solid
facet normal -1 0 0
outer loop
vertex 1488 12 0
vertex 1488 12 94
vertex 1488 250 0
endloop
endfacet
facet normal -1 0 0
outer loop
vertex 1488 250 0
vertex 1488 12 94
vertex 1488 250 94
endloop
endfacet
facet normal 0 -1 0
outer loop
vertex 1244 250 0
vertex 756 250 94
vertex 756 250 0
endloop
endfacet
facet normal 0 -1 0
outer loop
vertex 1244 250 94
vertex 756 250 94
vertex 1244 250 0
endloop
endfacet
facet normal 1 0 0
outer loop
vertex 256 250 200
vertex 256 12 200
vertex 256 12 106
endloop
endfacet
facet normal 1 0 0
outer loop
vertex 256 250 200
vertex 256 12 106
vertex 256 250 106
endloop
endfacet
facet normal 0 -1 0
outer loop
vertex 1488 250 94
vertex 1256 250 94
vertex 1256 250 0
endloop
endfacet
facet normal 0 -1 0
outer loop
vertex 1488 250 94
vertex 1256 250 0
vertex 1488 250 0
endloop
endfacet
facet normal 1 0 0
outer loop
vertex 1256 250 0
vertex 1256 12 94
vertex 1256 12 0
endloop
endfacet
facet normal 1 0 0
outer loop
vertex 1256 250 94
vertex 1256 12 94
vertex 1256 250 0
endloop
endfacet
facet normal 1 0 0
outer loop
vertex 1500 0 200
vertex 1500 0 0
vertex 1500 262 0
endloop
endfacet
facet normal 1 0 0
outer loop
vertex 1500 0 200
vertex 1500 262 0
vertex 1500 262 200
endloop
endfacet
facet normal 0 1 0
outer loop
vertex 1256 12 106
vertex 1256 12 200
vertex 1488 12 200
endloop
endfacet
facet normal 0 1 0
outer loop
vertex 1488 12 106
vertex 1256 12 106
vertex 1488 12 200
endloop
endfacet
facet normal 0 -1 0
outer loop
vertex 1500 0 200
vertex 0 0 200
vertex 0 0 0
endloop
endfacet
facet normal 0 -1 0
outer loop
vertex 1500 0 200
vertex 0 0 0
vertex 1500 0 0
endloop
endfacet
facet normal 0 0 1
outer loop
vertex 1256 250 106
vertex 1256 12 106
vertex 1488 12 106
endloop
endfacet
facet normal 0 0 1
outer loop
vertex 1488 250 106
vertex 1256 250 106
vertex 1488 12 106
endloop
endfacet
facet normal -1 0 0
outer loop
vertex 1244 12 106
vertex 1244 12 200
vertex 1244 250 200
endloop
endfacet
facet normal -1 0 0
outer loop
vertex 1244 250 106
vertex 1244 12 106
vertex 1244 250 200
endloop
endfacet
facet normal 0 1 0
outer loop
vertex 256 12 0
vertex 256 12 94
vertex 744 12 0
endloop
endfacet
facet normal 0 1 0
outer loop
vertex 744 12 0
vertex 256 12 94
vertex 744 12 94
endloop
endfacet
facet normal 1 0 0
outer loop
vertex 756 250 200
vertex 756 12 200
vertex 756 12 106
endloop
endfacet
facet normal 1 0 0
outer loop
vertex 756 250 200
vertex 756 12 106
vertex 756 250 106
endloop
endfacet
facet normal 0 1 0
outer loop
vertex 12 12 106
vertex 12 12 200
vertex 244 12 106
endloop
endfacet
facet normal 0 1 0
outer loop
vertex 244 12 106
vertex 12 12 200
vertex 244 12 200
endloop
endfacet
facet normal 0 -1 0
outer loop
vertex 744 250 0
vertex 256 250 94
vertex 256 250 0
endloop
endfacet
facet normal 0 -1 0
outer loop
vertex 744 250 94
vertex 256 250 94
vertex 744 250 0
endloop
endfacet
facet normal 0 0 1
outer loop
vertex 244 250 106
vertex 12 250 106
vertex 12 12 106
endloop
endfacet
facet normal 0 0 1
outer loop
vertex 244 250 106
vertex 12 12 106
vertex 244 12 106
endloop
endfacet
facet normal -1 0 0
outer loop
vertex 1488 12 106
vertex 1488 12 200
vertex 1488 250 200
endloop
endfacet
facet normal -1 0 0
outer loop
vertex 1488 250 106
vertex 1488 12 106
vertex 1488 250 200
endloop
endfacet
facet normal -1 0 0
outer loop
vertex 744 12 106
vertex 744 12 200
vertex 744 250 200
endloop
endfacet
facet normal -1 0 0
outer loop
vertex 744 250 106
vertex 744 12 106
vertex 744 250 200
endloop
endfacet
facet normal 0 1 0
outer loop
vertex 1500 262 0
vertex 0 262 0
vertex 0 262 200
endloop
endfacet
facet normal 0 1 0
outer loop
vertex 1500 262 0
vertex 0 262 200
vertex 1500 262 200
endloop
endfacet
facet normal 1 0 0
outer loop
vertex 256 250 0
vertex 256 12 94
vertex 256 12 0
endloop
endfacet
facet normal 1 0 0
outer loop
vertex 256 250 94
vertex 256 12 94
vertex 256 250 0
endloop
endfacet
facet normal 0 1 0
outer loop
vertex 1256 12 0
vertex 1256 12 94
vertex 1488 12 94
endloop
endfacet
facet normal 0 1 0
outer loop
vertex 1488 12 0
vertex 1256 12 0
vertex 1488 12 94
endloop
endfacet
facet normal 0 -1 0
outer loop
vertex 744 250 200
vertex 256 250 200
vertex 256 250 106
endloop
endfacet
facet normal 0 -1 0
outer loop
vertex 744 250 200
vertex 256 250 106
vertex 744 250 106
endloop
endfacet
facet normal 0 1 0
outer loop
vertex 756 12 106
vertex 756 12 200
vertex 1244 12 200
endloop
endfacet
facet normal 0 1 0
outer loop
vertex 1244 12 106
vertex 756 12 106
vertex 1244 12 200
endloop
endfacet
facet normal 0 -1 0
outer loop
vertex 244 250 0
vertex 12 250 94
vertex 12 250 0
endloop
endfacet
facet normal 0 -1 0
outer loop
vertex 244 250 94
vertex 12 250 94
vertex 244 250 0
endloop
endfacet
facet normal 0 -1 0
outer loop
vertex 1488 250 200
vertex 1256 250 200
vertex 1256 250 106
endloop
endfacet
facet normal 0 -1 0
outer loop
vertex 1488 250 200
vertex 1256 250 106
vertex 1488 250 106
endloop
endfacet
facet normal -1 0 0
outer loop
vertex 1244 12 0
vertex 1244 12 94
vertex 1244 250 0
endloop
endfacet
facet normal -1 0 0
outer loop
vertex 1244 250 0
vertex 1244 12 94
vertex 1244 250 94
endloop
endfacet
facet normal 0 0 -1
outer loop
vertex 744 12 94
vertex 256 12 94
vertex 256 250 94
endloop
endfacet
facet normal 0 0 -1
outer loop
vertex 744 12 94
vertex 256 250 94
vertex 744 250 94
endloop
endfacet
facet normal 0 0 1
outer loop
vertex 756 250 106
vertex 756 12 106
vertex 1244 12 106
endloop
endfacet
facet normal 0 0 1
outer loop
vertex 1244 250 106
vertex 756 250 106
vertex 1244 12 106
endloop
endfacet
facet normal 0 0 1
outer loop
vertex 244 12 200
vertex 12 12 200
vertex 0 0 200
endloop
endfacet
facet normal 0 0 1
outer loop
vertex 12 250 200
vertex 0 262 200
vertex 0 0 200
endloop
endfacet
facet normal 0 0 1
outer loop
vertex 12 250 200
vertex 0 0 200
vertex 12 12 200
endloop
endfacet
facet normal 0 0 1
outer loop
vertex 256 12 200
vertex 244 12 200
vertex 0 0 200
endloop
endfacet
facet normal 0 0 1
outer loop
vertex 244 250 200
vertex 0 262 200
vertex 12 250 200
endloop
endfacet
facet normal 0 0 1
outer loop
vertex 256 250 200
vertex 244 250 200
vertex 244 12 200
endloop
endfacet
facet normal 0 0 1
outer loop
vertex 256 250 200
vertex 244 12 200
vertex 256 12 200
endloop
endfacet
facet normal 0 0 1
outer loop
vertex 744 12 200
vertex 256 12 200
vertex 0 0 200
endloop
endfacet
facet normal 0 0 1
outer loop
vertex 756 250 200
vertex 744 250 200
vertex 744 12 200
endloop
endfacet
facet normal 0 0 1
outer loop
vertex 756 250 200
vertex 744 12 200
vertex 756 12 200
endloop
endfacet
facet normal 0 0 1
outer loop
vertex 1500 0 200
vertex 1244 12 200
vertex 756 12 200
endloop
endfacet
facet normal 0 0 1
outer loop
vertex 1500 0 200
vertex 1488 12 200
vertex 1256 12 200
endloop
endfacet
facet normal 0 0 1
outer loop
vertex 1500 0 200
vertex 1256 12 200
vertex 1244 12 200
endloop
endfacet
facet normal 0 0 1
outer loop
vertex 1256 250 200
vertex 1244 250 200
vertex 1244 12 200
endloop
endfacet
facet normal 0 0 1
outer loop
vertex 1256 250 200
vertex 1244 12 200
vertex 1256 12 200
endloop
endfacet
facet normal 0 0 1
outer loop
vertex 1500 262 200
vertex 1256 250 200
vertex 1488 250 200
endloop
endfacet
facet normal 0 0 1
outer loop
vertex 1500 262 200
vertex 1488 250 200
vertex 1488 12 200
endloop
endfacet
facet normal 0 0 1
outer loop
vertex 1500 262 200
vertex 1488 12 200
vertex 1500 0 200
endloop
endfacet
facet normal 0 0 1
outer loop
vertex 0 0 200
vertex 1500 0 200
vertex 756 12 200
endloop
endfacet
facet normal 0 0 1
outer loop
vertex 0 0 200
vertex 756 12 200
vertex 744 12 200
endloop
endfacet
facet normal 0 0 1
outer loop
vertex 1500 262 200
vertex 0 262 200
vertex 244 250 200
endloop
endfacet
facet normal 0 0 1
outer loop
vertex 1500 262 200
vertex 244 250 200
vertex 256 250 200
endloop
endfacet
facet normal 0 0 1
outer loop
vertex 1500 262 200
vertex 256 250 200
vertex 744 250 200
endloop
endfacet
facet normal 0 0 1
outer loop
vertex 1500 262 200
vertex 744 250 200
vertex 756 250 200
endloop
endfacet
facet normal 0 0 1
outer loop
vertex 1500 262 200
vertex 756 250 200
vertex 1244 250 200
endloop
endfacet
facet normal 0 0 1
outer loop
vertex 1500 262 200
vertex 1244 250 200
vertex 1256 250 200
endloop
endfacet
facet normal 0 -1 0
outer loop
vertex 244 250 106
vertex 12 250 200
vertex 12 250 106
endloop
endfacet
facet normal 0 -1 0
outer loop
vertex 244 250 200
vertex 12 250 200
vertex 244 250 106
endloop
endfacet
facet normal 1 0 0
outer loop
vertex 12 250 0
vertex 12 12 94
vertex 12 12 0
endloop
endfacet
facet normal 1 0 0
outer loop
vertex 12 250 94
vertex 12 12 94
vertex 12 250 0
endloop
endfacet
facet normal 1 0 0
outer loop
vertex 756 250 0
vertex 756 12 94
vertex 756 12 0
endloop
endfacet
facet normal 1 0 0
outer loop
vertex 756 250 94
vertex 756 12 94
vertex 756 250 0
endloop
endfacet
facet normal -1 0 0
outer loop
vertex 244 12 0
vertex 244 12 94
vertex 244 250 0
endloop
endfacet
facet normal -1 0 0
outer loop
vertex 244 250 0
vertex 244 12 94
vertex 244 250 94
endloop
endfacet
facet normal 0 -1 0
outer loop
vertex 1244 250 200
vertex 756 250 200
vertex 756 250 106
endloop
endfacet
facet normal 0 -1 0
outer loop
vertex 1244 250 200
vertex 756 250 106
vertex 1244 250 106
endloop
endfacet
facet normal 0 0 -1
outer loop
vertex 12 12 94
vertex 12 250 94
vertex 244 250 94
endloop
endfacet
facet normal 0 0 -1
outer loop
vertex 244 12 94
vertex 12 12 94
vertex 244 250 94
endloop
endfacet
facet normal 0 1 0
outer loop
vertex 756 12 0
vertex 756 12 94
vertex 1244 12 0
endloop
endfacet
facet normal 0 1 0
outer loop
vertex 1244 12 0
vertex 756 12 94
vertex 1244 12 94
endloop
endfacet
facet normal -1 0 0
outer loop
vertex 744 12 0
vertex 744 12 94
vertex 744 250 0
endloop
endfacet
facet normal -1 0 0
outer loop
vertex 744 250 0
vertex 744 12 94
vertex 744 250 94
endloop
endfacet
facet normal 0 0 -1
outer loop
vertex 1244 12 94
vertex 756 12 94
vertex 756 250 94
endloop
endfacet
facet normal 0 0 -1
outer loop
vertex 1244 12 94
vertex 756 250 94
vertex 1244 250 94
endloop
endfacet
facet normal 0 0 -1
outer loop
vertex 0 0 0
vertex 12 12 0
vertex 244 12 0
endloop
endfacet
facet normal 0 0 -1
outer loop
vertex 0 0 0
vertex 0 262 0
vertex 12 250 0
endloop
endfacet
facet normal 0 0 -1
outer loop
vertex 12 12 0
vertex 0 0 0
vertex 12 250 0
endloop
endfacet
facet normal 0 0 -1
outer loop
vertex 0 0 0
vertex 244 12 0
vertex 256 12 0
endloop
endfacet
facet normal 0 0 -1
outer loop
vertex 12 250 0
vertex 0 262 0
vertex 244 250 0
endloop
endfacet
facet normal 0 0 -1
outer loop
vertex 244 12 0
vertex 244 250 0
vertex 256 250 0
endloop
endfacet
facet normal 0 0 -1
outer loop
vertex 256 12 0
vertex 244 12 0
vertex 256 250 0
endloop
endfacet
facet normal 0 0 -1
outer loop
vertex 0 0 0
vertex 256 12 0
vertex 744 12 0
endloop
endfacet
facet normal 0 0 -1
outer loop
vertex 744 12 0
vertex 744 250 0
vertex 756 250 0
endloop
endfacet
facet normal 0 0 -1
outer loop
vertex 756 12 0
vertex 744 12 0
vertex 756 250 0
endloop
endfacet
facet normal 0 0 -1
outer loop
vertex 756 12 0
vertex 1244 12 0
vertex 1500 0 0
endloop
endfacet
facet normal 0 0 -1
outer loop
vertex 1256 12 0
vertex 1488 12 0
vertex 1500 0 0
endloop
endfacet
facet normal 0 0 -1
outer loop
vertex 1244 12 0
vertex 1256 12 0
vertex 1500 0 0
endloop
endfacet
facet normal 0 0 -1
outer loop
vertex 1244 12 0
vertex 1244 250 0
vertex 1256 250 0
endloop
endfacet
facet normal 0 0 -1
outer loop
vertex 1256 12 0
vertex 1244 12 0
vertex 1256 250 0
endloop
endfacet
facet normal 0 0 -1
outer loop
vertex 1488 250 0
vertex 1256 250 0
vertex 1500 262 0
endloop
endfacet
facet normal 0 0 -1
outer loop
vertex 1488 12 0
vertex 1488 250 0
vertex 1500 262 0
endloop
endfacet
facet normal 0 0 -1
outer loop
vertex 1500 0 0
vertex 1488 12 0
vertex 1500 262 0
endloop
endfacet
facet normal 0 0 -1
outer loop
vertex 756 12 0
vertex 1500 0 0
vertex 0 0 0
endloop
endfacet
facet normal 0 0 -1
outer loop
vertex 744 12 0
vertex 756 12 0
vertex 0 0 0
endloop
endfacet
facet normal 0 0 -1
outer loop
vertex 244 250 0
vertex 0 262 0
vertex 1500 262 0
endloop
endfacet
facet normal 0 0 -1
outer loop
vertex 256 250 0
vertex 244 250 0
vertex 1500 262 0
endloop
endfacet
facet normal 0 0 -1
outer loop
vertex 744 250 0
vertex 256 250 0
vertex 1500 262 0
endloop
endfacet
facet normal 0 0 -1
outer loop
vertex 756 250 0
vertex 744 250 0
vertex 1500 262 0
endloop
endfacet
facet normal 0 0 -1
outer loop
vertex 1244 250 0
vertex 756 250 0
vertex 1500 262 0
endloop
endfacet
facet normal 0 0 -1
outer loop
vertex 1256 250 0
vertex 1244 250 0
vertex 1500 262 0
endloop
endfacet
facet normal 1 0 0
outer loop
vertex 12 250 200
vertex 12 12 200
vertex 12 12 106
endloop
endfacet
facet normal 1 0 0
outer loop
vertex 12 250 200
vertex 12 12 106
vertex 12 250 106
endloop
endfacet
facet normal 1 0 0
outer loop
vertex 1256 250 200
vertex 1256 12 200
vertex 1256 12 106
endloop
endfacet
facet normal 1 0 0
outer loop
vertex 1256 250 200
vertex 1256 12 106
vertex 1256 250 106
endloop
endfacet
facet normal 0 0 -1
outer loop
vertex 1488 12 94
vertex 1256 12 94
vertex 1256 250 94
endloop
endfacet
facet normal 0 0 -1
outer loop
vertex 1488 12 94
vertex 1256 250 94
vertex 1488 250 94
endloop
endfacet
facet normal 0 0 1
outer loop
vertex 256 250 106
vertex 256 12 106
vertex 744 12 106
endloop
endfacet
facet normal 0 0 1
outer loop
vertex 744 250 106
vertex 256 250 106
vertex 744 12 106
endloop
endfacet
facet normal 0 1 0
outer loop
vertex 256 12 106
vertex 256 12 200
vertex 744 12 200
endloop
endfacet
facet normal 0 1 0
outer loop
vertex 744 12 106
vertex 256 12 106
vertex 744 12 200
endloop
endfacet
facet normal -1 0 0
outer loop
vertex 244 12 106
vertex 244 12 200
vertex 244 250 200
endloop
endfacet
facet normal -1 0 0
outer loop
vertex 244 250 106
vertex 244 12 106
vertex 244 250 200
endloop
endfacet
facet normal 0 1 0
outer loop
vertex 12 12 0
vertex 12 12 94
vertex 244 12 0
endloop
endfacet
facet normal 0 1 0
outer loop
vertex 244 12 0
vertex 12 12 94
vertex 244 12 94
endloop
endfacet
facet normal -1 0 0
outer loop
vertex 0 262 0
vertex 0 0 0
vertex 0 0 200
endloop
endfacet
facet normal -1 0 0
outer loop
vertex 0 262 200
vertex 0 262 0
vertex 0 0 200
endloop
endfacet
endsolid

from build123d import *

# Parameters (mm, degrees)
SKETCH_1_W           = 1500
SKETCH_1_H           = 262
EXTRUDE_1_DEPTH      = 200
SKETCH_5_W           = 232
SKETCH_5_H           = 238
SKETCH_5_W_2         = 488
CUT_EXTRUDE_10_DEPTH = 1536.787745751
SKETCH_7_W           = 1500
SKETCH_7_H           = 12
EXTRUDE_13_DEPTH     = 260


with BuildPart() as part:
    # 草图1 → 拉伸1 (new body)
    with BuildSketch(Plane.XY):
        with Locations((750, 131)):
            Rectangle(SKETCH_1_W, SKETCH_1_H)
    extrude(amount=EXTRUDE_1_DEPTH)

    # 草图5 → 拉伸10 (cut, through all)
    with BuildSketch(Plane.XY.offset(200)):
        with Locations((128, 131)):
            Rectangle(SKETCH_5_W, SKETCH_5_H)
        with Locations((500, 131)):
            Rectangle(SKETCH_5_W_2, SKETCH_5_H)
        with Locations((1000, 131)):
            Rectangle(SKETCH_5_W_2, SKETCH_5_H)
        with Locations((1372, 131)):
            Rectangle(SKETCH_5_W, SKETCH_5_H)
    extrude(amount=-CUT_EXTRUDE_10_DEPTH, mode=Mode.SUBTRACT)

    # 草图7 → 拉伸13 (add)
    with BuildSketch(Plane.XZ):
        with Locations((750, 100)):
            Rectangle(SKETCH_7_W, SKETCH_7_H)
    extrude(amount=-EXTRUDE_13_DEPTH)


solid = part.part
